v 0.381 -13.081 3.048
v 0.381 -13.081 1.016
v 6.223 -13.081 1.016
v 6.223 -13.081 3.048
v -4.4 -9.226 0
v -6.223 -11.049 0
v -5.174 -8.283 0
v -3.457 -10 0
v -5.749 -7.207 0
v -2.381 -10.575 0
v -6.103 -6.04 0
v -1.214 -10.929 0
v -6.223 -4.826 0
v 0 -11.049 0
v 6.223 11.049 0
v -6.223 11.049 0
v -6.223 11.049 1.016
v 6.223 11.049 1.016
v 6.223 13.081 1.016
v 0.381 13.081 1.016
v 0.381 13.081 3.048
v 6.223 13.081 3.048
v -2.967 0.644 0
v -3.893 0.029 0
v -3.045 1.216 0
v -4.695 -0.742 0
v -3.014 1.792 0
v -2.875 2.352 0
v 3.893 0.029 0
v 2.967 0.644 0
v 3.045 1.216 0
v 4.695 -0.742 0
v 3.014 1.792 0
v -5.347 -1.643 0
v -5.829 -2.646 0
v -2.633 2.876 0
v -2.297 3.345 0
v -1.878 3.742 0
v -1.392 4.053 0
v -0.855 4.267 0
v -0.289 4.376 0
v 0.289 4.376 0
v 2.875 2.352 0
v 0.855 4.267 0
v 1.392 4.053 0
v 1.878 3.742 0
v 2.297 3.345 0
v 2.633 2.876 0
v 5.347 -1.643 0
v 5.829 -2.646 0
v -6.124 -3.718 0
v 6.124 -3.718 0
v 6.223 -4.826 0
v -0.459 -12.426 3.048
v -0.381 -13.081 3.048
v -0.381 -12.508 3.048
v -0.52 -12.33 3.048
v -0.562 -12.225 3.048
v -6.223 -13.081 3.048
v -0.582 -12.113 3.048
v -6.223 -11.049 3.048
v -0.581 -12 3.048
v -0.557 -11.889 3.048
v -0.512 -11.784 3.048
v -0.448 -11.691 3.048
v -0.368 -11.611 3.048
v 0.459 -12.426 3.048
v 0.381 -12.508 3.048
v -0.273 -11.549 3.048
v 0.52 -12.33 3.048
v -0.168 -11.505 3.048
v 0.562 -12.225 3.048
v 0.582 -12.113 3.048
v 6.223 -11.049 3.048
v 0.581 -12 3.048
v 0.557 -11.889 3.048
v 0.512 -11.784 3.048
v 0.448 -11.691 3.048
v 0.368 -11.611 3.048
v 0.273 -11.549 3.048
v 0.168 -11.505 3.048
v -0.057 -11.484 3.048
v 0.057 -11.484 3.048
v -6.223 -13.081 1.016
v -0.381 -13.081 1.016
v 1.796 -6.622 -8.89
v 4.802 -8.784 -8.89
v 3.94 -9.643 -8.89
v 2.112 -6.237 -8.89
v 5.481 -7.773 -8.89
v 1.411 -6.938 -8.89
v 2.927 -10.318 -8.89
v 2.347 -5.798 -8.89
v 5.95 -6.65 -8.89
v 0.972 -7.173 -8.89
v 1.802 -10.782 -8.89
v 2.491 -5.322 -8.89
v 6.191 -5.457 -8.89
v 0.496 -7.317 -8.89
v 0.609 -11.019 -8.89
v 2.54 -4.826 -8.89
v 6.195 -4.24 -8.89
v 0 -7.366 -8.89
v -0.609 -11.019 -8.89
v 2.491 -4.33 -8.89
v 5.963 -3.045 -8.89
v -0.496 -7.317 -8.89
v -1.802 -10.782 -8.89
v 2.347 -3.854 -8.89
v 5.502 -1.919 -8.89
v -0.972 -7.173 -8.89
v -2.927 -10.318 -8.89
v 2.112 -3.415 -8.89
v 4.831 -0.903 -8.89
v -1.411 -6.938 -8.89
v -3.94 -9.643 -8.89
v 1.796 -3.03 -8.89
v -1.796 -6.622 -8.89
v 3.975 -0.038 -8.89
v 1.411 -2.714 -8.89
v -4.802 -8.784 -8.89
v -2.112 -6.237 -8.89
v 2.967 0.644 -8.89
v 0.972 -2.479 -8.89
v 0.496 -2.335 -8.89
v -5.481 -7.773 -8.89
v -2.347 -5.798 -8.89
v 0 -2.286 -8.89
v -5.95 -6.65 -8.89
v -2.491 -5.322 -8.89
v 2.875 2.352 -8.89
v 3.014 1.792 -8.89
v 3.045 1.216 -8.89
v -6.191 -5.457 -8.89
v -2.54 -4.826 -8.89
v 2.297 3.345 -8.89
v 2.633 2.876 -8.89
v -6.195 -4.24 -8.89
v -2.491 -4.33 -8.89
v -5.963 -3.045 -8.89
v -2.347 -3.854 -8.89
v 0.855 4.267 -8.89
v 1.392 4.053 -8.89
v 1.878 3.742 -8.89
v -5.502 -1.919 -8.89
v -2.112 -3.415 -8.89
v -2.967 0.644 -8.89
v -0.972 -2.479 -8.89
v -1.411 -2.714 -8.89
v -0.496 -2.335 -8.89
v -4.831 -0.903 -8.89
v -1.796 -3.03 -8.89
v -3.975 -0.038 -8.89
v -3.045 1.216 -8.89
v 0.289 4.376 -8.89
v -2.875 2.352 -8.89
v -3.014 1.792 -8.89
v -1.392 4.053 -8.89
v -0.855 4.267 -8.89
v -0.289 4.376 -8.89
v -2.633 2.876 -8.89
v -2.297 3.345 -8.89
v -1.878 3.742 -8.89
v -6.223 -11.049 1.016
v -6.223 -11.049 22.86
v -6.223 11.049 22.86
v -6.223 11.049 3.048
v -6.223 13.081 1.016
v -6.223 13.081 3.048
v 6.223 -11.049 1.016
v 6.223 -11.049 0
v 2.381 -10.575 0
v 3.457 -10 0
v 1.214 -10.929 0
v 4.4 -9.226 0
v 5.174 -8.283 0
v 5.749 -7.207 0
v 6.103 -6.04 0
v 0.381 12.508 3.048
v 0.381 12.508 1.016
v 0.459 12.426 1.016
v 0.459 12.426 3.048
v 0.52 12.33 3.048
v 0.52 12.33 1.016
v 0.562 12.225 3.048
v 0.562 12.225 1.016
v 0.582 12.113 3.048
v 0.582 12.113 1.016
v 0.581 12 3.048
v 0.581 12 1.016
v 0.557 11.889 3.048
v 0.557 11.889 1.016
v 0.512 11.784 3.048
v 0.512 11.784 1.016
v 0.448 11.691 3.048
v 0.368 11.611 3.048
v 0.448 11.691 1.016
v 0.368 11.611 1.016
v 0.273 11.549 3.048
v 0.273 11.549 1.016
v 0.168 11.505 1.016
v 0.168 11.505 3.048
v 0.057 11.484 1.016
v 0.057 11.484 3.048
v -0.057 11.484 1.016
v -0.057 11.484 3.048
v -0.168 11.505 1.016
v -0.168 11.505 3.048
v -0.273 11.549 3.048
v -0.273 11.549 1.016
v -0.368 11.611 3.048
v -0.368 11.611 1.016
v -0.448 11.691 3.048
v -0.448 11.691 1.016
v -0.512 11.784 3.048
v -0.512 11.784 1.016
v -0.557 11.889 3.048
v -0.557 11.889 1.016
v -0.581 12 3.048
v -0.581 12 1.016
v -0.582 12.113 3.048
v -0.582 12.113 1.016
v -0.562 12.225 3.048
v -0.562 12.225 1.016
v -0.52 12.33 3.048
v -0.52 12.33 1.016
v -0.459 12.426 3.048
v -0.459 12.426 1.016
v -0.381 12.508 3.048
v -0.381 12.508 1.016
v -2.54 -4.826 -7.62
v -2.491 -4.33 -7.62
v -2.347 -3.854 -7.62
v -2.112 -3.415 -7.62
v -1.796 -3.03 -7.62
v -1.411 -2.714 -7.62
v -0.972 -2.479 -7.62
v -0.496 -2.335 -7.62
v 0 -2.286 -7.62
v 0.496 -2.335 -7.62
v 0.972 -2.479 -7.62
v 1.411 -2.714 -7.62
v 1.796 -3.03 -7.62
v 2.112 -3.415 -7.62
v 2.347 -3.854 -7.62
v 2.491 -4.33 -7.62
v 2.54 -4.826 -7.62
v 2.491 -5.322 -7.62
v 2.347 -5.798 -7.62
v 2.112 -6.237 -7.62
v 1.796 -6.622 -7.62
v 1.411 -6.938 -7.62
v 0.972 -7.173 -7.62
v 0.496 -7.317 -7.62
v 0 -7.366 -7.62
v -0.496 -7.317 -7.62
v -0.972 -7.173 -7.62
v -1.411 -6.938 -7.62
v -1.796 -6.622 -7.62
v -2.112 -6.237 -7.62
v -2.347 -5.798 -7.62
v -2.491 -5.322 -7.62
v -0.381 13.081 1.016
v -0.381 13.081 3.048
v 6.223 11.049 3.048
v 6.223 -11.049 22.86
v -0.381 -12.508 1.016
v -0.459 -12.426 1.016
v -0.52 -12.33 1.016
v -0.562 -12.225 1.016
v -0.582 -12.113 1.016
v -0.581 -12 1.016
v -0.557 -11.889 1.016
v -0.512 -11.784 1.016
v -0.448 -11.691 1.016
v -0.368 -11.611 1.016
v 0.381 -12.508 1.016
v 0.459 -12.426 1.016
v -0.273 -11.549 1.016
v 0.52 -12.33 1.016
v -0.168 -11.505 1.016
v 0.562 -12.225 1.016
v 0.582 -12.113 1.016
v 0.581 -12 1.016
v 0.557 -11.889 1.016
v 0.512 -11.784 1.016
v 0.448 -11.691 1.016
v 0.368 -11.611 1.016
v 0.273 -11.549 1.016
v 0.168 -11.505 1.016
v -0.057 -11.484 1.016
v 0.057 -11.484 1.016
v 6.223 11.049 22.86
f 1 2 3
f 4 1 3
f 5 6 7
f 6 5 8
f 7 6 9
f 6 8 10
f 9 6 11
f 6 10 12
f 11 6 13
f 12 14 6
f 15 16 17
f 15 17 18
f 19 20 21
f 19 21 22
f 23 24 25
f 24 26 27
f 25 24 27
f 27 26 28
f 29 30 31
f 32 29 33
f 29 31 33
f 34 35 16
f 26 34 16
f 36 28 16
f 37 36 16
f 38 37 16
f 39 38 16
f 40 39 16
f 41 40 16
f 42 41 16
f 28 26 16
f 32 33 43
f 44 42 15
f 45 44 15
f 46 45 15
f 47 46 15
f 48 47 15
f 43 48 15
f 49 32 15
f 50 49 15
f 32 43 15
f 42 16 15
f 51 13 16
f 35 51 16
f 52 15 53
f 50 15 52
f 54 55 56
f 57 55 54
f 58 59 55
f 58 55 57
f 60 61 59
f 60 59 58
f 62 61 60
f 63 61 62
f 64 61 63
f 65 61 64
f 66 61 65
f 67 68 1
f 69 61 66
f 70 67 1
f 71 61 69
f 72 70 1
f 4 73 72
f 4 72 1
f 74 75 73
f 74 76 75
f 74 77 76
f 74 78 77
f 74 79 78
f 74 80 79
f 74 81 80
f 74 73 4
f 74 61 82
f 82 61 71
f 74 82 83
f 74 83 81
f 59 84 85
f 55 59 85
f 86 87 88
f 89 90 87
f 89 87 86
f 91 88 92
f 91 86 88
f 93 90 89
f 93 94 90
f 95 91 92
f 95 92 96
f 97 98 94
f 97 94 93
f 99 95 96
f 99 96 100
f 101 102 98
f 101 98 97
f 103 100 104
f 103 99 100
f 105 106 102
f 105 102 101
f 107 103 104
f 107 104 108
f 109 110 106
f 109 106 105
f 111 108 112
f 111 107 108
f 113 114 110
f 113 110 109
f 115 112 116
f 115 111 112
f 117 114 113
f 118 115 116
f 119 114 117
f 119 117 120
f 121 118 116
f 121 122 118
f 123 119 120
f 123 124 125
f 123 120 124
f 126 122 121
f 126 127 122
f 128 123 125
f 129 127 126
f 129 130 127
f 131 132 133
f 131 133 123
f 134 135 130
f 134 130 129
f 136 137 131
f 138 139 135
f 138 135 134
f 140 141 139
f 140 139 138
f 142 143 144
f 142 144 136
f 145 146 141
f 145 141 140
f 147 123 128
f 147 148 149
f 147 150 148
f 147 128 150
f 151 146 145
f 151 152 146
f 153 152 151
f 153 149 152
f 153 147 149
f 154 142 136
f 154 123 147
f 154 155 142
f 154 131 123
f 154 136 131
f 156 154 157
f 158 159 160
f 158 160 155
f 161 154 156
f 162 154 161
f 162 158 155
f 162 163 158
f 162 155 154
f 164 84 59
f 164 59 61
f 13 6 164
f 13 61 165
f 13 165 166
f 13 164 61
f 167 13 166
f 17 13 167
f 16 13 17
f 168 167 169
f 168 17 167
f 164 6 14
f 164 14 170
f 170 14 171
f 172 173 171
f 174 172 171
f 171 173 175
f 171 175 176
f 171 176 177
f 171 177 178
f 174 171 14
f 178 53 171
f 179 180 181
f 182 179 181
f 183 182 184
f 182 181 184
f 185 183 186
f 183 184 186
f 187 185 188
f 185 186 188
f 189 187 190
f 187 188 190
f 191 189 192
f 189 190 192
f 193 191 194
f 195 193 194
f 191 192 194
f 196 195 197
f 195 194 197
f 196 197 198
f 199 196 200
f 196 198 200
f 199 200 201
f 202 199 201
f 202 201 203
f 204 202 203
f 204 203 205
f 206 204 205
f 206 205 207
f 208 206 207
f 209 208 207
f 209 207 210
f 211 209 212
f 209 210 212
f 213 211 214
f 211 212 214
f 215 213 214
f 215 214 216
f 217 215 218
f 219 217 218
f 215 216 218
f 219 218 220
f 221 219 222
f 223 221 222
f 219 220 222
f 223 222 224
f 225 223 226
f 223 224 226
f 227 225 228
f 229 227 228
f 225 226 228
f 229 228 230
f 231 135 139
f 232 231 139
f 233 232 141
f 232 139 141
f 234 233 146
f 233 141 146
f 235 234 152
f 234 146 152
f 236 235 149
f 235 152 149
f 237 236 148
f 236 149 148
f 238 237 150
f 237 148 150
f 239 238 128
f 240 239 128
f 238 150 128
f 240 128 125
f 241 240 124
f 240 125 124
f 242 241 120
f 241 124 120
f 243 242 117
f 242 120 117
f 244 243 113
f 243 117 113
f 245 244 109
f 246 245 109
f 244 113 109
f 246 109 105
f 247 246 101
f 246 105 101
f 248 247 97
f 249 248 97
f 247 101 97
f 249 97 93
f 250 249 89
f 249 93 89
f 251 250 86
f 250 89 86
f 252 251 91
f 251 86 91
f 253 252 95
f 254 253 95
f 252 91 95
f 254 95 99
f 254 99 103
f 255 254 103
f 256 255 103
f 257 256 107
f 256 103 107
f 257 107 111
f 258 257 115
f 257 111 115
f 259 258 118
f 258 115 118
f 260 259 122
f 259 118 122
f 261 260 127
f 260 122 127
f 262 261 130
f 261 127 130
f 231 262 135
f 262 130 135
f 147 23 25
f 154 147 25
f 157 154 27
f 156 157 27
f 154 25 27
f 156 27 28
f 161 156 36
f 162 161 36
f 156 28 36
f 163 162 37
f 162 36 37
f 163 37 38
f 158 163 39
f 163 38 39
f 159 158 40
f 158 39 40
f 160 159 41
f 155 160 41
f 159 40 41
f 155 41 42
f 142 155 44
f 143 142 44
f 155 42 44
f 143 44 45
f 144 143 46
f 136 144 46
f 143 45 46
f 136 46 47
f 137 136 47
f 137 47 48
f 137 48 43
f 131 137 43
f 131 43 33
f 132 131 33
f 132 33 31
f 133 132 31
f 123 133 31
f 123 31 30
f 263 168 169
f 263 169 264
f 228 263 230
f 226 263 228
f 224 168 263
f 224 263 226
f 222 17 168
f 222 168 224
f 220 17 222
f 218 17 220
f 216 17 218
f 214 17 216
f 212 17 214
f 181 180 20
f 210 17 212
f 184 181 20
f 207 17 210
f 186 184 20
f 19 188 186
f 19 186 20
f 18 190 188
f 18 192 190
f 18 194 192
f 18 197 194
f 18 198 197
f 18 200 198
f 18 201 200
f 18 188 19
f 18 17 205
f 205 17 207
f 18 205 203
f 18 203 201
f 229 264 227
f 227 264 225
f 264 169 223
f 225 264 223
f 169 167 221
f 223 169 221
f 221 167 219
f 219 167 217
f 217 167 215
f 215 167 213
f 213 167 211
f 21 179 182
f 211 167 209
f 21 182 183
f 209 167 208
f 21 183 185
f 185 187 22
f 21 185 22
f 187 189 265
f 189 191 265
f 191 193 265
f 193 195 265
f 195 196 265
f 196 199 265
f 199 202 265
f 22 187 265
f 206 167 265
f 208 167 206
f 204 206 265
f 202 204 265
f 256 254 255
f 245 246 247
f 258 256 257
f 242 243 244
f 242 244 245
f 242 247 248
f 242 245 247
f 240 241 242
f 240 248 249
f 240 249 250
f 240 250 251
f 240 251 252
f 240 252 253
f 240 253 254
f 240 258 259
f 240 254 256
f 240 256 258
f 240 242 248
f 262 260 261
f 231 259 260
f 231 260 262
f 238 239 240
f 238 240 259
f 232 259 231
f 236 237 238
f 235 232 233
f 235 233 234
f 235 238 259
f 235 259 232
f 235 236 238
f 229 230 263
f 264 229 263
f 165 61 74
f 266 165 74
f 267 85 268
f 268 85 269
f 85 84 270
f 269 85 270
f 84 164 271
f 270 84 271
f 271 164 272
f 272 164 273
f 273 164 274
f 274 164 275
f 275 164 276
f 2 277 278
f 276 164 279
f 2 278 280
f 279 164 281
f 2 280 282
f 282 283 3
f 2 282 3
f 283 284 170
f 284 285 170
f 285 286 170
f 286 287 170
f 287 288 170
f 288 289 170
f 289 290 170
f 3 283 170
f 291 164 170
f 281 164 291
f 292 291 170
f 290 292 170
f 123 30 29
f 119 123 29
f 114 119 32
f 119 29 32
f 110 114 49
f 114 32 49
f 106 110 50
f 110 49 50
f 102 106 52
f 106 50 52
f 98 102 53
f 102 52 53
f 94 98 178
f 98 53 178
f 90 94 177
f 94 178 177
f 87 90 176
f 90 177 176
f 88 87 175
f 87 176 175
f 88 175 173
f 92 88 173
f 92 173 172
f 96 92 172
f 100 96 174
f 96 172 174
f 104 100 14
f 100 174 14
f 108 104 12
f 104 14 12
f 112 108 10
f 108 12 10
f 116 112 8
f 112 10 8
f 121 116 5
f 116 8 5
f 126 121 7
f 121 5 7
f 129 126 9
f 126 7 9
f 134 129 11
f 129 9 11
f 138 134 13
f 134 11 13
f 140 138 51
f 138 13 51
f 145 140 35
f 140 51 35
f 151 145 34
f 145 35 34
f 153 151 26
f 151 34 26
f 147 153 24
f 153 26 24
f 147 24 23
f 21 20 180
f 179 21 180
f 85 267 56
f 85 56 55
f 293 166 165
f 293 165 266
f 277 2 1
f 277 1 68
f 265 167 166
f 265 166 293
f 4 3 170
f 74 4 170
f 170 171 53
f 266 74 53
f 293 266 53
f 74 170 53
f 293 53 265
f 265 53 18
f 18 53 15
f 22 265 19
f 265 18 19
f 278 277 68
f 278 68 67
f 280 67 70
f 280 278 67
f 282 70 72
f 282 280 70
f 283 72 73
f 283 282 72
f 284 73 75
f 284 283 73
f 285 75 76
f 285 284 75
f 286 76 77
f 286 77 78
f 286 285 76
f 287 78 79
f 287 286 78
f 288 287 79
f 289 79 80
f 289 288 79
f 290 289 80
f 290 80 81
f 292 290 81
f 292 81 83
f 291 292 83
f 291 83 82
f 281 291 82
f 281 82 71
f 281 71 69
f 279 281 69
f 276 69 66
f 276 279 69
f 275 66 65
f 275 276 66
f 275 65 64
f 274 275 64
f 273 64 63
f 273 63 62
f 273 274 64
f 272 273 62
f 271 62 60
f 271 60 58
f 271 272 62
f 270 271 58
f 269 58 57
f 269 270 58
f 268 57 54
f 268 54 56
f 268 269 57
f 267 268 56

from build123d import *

# Parameters (mm, degrees)
SKETCH1_W           = 12.446
SKETCH1_H           = 22.098
BOSS_EXTRUDE1_DEPTH = 22.86
SKETCH2_W           = 12.446
SKETCH2_H           = 2.032
BOSS_EXTRUDE2_DEPTH = 2.032
CUT_EXTRUDE1_DEPTH  = 2.032
BOSS_EXTRUDE3_DEPTH = 8.89
SKETCH5_R           = 2.54
CUT_EXTRUDE2_DEPTH  = 1.27


with BuildPart() as part:
    # Sketch1 → Boss-Extrude1 (new body)
    with BuildSketch(Plane.XY):
        Rectangle(SKETCH1_W, SKETCH1_H)
    extrude(amount=BOSS_EXTRUDE1_DEPTH)

    # Sketch2 → Boss-Extrude2 (add)
    with BuildSketch(Plane(origin=(0, 11.049, 0), x_dir=(1, 0, 0), z_dir=(0, 1, 0))):
        with Locations((0, -2.032)):
            Rectangle(SKETCH2_W, SKETCH2_H)
    boss_extrude2 = extrude(amount=BOSS_EXTRUDE2_DEPTH)

    # Sketch3 → Cut-Extrude1 (cut)
    with BuildSketch(Plane(origin=(0, 0, 1.016), x_dir=(-1, 0, 0), z_dir=(0, 0, -1))):
        with BuildLine():
            Line((-0.381, 13.081), (-0.381, 12.507864133))
            ThreePointArc((-0.381, 12.507864133), (0, 11.4808), (0.381, 12.507864133))
            Line((0.381, 12.507864133), (0.381, 13.081))
            Line((0.381, 13.081), (-0.381, 13.081))
        make_face()
    cut_extrude1 = extrude(amount=-CUT_EXTRUDE1_DEPTH, mode=Mode.SUBTRACT)

    # Mirror1: Boss-Extrude2 across plane
    add(boss_extrude2.mirror(Plane.ZX))

    # Mirror2: Cut-Extrude1 across plane
    add(cut_extrude1.mirror(Plane.ZX), mode=Mode.SUBTRACT)

    # Sketch4 → Boss-Extrude3 (add)
    with BuildSketch(Plane(origin=(0, 0, 0), x_dir=(-1, 0, 0), z_dir=(0, 0, -1))):
        with BuildLine():
            ThreePointArc((-2.967141975, 0.644082038), (0, -11.049), (2.967141975, 0.644082038))
            ThreePointArc((2.967141975, 0.644082038), (0, 4.389486154), (-2.967141975, 0.644082038))
        make_face()
    extrude(amount=BOSS_EXTRUDE3_DEPTH)

    # Sketch5 → Cut-Extrude2 (cut)
    with BuildSketch(Plane(origin=(0, 0, -8.89), x_dir=(-1, 0, 0), z_dir=(0, 0, -1))):
        with Locations((0, -4.826)):
            Circle(SKETCH5_R)
    extrude(amount=-CUT_EXTRUDE2_DEPTH, mode=Mode.SUBTRACT)


solid = part.part
